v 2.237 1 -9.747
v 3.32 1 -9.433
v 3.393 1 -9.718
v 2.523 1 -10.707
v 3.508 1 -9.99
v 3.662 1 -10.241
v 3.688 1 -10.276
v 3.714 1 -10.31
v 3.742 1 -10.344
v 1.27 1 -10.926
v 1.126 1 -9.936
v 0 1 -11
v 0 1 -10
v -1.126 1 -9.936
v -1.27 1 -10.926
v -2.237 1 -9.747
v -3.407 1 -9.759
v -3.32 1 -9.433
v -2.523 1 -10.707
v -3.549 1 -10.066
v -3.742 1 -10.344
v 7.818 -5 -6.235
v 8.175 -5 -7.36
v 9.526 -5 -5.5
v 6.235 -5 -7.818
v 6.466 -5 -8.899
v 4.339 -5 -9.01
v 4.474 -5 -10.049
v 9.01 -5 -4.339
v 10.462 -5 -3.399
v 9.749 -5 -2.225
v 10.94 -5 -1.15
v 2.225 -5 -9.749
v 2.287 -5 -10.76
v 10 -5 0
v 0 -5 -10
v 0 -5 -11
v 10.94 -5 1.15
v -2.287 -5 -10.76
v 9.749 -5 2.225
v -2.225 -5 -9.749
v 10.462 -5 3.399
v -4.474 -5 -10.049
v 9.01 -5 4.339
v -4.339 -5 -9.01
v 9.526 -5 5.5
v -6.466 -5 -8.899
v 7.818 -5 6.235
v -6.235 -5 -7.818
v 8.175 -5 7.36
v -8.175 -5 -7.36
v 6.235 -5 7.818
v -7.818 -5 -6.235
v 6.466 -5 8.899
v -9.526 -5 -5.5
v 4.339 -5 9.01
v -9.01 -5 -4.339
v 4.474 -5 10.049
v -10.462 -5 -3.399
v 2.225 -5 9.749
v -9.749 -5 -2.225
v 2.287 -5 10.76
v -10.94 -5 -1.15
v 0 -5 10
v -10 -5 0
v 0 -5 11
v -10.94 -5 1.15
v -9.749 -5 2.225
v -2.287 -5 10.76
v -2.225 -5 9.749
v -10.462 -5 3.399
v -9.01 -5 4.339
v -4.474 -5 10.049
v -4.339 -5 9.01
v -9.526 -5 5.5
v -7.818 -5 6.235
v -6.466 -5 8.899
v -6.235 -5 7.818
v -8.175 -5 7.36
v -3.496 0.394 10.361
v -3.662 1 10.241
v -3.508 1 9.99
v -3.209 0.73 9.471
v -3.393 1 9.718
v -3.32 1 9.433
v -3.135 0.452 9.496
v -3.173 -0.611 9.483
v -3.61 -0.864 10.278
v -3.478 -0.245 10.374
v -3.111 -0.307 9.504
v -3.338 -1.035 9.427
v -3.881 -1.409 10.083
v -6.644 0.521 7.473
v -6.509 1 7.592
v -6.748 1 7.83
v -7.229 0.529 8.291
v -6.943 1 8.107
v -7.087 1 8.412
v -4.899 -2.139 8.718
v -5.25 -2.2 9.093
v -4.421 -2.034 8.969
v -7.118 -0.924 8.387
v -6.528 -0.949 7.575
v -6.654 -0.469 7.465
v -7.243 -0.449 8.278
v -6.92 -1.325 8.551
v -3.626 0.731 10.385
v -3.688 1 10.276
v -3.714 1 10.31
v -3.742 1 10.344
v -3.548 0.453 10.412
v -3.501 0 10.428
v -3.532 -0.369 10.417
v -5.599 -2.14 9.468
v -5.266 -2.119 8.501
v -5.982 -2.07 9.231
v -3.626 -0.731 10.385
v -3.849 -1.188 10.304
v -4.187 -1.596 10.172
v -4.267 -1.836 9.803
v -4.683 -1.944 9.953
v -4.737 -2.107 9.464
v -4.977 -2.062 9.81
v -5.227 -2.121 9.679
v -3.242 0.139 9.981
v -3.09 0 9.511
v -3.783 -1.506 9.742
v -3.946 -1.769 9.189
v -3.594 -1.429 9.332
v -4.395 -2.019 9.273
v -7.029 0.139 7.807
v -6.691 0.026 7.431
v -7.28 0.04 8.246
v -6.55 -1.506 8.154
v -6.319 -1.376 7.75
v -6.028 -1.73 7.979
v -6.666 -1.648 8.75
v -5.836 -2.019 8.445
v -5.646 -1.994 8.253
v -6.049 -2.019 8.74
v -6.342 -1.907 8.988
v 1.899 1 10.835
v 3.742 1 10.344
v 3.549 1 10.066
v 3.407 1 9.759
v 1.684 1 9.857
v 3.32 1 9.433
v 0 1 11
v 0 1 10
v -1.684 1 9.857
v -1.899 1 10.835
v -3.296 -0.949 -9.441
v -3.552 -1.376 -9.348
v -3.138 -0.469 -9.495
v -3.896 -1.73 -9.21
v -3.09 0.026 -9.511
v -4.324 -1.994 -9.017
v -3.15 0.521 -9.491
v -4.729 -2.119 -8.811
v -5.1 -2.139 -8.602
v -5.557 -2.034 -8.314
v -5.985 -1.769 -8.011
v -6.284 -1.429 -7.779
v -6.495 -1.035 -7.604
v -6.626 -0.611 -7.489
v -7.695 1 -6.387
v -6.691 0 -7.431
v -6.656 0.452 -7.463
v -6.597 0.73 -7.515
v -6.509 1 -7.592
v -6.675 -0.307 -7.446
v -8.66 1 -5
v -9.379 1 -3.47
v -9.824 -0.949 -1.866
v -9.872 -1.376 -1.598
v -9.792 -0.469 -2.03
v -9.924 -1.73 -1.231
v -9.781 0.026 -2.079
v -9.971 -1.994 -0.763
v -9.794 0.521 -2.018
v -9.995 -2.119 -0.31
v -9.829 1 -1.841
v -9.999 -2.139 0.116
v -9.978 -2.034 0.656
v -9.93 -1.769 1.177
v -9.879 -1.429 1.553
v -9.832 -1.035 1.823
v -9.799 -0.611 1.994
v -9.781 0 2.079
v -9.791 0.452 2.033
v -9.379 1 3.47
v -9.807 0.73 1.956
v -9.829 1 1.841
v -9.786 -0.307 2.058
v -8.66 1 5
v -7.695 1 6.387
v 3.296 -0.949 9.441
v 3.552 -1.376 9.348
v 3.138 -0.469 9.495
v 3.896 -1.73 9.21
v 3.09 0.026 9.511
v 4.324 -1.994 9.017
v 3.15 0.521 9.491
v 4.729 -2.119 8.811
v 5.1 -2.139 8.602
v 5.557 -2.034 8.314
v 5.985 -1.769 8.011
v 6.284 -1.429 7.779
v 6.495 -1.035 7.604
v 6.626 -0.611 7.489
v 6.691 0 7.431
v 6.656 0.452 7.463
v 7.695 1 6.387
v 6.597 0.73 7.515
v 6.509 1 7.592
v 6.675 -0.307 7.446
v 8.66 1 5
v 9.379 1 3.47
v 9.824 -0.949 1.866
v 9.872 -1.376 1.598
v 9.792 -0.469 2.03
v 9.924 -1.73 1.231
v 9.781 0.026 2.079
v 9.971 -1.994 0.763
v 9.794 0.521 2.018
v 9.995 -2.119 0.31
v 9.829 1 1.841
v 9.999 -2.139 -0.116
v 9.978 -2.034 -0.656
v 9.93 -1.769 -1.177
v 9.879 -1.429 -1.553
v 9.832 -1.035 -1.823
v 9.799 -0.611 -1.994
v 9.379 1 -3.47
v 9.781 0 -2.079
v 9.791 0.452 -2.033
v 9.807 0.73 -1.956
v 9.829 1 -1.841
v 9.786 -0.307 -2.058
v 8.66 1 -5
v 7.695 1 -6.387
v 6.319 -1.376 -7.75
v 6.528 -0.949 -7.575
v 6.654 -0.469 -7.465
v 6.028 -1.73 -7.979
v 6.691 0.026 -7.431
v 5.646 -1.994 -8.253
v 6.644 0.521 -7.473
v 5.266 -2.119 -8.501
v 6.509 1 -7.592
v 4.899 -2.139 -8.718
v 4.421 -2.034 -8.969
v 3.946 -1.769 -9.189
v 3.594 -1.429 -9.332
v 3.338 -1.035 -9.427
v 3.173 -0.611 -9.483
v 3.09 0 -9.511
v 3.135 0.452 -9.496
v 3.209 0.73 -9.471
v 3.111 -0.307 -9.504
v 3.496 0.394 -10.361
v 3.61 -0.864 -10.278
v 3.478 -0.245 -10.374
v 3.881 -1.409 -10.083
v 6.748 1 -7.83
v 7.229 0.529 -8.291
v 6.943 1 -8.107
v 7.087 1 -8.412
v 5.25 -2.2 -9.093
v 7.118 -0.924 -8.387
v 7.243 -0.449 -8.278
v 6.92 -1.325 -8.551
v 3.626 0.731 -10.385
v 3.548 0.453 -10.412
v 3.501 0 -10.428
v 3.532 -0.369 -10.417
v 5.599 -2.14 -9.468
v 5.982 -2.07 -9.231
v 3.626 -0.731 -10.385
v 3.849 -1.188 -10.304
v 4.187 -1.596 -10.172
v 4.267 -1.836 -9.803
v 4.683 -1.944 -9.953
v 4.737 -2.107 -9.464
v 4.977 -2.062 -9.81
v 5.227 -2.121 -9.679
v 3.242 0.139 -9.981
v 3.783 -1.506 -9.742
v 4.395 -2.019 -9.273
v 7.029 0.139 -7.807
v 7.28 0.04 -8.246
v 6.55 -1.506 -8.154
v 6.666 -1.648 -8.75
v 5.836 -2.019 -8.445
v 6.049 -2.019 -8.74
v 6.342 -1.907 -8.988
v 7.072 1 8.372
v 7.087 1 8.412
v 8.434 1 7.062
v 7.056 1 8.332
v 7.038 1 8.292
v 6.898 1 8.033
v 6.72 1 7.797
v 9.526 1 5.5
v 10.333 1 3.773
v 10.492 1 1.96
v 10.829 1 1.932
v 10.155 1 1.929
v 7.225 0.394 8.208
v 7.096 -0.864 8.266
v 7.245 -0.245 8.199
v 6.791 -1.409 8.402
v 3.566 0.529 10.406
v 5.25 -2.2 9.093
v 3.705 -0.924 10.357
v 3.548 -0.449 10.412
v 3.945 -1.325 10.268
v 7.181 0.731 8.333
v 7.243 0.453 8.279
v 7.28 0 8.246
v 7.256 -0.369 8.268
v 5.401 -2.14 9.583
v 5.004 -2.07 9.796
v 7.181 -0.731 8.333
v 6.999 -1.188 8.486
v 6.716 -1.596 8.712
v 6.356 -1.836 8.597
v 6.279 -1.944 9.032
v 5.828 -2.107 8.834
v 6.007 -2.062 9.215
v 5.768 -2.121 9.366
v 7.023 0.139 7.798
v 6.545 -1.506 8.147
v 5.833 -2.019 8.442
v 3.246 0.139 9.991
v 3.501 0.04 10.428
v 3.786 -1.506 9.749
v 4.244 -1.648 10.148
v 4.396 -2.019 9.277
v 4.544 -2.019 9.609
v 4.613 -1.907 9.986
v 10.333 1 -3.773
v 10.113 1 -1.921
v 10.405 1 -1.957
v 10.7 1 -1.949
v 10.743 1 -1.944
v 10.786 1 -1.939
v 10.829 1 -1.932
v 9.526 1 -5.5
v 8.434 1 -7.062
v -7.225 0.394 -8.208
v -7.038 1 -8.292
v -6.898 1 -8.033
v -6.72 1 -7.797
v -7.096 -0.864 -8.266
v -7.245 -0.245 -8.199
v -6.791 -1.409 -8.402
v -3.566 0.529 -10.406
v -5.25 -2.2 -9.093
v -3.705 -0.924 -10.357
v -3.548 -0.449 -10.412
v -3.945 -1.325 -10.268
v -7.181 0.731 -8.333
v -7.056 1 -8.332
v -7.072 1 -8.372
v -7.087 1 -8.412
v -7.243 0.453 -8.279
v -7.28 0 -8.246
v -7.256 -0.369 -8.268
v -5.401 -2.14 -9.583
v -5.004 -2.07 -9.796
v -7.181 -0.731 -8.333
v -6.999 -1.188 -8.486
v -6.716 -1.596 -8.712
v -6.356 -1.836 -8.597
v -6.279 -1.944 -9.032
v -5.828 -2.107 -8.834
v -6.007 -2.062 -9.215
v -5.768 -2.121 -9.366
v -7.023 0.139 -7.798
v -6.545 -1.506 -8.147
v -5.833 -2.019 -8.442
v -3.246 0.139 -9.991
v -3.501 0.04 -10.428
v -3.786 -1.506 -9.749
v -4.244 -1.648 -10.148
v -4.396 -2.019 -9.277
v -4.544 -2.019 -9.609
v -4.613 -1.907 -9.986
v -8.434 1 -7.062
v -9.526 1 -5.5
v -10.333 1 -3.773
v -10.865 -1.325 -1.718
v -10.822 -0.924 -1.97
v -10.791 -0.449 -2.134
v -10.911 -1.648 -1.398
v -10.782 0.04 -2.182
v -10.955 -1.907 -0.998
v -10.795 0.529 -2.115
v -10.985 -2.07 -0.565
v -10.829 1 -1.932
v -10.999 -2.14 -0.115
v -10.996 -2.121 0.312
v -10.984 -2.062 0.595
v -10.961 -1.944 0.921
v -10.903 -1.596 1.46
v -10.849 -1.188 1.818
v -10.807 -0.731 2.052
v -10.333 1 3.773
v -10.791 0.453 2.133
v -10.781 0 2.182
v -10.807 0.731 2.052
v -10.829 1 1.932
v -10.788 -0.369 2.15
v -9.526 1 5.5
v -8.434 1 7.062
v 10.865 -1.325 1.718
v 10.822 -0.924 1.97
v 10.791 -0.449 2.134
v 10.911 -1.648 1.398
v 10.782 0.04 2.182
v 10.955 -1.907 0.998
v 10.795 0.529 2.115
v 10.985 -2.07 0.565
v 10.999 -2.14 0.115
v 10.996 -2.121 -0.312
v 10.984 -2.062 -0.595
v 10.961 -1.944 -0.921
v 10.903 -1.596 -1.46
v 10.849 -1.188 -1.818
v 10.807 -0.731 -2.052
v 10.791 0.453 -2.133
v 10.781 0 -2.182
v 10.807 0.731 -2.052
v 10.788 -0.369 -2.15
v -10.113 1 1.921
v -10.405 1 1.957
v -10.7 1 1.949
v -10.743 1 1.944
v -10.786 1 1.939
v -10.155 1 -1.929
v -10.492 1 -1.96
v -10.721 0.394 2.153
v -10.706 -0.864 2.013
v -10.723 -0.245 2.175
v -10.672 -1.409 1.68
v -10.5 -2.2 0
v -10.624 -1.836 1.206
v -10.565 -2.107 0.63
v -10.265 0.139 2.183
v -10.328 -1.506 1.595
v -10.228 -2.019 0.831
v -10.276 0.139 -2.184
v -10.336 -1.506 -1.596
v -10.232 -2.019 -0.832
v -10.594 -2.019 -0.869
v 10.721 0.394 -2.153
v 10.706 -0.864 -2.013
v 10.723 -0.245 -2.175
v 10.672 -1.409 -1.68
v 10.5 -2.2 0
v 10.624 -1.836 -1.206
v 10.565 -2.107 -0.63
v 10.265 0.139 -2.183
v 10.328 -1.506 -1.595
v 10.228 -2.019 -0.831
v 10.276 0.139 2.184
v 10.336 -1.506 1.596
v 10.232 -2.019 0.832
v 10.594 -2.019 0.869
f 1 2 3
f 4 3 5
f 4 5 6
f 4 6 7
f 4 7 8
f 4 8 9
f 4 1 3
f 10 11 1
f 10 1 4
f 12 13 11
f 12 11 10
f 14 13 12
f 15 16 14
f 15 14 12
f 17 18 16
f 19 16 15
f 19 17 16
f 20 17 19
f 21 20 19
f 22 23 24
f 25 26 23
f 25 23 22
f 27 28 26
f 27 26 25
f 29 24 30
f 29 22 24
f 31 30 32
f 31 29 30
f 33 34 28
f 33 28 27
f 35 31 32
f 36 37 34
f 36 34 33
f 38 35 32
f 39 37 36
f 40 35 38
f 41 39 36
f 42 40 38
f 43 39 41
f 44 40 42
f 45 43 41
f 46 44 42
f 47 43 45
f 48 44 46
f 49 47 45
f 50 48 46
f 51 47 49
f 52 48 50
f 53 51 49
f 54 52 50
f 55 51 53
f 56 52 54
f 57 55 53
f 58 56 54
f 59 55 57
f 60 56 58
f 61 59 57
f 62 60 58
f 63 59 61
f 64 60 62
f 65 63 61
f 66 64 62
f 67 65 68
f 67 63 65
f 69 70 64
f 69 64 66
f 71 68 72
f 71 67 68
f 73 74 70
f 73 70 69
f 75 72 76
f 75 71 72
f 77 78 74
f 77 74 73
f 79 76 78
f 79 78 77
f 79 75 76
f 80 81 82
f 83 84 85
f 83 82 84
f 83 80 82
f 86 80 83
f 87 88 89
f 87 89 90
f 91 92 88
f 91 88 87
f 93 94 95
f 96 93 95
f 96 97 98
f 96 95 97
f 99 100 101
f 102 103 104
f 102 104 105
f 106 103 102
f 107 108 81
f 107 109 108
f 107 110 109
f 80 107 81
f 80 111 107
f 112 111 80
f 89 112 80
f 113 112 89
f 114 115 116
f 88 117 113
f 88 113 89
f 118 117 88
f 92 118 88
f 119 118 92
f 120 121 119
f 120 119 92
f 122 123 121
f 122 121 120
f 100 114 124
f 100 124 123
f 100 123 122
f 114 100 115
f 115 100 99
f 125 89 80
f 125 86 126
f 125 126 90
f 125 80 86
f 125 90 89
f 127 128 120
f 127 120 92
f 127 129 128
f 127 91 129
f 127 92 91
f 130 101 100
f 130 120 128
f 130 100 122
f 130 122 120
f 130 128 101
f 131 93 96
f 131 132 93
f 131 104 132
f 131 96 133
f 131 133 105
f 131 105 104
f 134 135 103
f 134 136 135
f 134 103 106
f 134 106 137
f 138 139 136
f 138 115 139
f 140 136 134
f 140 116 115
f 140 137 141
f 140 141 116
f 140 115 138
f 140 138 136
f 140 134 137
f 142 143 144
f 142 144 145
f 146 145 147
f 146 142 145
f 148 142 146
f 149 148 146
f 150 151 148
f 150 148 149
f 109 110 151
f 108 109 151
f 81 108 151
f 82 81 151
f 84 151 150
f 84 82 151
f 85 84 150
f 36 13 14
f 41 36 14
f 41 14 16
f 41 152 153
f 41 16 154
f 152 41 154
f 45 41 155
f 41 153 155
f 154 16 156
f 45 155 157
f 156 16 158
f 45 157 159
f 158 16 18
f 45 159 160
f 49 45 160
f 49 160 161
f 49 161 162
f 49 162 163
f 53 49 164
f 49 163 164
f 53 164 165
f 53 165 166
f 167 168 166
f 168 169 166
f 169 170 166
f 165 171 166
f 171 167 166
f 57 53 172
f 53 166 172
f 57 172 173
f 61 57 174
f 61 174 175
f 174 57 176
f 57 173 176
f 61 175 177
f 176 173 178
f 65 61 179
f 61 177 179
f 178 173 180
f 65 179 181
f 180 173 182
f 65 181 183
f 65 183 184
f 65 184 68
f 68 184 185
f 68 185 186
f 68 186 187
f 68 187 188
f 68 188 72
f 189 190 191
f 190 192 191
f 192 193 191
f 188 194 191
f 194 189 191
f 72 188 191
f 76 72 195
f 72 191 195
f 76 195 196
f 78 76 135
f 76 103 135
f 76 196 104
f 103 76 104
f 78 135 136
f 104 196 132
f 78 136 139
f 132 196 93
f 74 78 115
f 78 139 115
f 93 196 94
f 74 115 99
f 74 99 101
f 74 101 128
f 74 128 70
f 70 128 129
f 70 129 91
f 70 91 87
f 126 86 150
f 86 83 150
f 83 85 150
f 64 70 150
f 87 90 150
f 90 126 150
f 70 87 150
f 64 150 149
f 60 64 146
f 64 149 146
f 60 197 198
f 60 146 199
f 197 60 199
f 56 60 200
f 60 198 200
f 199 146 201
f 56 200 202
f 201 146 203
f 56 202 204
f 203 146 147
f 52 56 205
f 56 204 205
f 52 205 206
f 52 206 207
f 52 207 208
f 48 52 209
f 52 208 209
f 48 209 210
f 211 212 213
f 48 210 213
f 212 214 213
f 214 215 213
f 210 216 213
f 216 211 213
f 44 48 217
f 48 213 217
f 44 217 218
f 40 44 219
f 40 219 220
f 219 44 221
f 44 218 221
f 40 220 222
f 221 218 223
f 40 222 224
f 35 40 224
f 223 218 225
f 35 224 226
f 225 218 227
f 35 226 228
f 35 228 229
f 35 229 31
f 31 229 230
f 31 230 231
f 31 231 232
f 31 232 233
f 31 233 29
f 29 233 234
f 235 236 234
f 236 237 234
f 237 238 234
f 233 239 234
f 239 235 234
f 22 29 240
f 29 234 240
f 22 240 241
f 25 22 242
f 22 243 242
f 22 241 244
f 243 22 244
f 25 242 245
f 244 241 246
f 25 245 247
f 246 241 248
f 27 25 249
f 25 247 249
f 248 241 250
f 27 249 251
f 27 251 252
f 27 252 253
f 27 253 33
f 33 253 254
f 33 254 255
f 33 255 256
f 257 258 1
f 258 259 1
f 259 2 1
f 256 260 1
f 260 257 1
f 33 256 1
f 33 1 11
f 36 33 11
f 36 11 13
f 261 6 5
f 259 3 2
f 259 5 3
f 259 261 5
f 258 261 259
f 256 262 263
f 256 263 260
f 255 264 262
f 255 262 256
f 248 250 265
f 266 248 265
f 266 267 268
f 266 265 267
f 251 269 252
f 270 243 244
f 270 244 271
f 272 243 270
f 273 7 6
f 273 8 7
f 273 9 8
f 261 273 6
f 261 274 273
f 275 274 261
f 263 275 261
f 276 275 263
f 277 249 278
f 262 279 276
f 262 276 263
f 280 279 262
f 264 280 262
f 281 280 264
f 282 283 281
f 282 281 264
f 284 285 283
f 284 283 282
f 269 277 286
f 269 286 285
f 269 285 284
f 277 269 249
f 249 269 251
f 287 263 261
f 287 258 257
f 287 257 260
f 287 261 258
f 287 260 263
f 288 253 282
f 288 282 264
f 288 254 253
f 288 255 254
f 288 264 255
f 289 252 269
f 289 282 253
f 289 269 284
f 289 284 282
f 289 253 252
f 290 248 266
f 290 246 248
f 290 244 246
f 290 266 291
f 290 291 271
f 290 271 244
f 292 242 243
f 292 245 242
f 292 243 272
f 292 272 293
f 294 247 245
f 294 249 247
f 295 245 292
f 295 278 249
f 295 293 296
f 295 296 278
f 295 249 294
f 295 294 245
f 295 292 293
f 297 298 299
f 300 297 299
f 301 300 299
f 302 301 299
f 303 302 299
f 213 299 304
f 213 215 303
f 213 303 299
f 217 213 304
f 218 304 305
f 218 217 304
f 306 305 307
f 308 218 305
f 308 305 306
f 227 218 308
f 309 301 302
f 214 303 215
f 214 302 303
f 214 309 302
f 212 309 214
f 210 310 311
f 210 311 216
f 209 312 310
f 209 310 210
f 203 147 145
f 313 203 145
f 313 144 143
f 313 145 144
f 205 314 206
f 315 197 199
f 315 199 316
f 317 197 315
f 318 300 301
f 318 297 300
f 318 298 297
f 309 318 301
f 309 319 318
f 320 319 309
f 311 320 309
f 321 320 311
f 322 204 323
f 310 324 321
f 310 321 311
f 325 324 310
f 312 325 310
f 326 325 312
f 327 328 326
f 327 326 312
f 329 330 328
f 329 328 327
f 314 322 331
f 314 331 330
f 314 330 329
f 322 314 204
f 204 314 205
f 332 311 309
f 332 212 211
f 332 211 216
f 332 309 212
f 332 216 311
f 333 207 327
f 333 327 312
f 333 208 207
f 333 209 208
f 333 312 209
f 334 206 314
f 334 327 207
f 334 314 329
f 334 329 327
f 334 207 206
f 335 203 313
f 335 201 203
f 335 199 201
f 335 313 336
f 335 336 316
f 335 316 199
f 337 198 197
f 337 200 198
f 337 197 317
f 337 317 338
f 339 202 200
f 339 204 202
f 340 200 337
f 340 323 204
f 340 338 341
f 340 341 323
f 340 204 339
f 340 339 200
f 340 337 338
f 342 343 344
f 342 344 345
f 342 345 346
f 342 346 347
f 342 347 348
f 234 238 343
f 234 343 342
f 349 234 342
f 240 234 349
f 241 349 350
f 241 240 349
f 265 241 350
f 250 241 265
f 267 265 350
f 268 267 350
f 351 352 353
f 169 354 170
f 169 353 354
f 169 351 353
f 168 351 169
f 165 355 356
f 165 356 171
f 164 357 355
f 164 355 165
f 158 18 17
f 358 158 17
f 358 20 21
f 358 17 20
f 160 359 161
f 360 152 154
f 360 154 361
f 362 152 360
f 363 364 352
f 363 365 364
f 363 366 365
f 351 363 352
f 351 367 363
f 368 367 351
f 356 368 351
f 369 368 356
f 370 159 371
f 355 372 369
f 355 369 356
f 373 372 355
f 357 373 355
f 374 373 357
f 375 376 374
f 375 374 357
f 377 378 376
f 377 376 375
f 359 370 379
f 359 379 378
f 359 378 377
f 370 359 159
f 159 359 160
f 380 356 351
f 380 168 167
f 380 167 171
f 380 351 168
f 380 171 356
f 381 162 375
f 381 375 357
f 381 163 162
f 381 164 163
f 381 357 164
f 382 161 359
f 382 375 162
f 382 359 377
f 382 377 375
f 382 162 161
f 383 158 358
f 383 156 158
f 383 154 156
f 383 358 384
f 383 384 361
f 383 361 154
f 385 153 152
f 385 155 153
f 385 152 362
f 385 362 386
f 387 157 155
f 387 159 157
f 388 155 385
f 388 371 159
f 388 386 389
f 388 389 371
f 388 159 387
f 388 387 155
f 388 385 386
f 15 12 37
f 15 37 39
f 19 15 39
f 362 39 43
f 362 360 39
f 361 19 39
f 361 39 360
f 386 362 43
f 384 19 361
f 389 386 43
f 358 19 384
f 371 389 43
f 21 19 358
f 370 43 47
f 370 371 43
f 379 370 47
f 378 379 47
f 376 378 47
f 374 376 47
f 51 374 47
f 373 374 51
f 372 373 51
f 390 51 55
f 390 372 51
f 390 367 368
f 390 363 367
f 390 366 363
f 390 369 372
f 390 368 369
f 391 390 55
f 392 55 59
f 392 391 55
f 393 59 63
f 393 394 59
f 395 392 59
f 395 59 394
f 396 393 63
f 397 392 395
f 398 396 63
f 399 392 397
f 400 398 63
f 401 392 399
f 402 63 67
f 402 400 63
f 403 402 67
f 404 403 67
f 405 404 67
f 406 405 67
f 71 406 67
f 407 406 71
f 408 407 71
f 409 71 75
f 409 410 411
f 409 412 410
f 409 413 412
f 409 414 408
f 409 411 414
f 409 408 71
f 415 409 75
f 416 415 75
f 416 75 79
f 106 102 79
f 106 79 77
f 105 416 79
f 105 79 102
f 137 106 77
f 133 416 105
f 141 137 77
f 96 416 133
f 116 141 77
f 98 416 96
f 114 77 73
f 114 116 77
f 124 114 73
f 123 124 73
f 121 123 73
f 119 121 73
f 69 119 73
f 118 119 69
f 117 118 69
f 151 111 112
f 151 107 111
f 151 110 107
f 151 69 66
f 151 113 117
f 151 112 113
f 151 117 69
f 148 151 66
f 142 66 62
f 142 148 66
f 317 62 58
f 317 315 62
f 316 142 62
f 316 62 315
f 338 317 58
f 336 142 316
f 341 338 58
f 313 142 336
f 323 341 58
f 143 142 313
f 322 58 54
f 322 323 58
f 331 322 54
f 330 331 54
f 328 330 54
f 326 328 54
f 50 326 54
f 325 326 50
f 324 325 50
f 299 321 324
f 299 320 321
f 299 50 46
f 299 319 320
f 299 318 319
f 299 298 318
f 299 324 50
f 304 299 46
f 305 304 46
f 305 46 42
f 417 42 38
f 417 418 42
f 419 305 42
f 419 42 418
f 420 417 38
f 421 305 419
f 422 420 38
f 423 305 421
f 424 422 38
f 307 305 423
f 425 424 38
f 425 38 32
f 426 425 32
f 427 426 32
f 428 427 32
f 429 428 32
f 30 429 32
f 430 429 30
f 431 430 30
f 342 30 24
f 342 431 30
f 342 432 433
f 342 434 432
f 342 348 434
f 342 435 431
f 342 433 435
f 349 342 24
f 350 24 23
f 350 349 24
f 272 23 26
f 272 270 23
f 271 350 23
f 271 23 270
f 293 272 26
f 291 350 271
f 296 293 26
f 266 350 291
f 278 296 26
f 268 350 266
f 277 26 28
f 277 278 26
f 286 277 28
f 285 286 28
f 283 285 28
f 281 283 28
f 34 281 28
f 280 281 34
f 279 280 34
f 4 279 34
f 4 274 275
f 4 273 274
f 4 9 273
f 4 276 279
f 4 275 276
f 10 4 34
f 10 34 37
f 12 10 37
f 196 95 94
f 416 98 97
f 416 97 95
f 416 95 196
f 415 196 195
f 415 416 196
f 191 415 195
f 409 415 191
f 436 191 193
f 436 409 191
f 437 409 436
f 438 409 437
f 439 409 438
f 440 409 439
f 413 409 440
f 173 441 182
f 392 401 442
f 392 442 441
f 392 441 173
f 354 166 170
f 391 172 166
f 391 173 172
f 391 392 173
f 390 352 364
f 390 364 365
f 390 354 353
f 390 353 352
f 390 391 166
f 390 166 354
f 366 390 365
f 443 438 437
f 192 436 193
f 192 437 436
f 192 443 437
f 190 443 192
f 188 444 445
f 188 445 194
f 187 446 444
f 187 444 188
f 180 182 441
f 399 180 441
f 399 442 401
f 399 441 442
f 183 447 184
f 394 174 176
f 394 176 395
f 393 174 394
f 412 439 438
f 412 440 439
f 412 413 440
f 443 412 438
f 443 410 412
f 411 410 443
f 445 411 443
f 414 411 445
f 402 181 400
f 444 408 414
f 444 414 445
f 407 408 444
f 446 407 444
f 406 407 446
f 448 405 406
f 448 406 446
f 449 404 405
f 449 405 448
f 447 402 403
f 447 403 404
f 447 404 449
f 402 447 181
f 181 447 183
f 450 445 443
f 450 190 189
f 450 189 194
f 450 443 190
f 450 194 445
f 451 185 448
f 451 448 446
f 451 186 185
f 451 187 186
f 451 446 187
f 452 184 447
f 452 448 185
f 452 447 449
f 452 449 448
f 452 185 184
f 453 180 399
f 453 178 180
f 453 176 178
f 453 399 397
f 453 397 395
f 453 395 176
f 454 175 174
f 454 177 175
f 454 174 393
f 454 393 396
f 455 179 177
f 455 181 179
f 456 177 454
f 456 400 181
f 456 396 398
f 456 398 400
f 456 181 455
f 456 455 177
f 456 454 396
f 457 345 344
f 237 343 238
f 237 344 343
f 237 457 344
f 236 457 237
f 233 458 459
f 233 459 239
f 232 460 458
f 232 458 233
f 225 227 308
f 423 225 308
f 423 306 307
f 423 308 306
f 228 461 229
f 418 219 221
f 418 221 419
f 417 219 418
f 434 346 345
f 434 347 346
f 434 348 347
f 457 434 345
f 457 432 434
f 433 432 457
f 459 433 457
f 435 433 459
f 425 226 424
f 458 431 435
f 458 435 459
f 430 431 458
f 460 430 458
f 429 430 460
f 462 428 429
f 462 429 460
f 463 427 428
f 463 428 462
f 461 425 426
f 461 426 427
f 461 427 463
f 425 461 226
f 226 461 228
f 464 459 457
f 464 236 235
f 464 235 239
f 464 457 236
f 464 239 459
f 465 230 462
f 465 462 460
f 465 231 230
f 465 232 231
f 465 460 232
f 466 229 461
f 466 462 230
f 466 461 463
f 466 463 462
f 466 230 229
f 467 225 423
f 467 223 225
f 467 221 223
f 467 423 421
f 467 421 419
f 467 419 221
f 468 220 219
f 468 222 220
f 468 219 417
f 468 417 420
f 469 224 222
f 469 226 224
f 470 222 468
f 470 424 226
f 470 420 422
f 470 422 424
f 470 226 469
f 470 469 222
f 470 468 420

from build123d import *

# Parameters (mm, degrees)
SKETCH3_W          = 1
SKETCH3_H          = 10
CIRPATTERN1_COUNT  = 6
SKETCH5_R          = 11
SKETCH5_R_2        = 10
CUT_EXTRUDE1_DEPTH = 4


with BuildPart() as part:
    # Sketch3 → Revolve3 (revolve)
    with BuildSketch(Plane.XY):
        with Locations((10.5, 0)):
            Rectangle(SKETCH3_W, SKETCH3_H)
    revolve(axis=Axis((0, 0, 0), (0, 1, 0)))

    # Sketch4 → Cut-Revolve1 (revolve, cut)
    with BuildSketch(Plane.XY):
        with BuildLine():
            Line((10.5, 2.2), (10.5, -2.2))
            ThreePointArc((10.5, -2.2), (12.055634919, -1.555634919), (12.7, 0))
            ThreePointArc((12.7, 0), (12.055634919, 1.555634919), (10.5, 2.2))
        make_face()
    cut_revolve1 = revolve(axis=Axis((10.5, -2.2, 0), (0, 1, 0)), mode=Mode.SUBTRACT)

    # CirPattern1: Cut-Revolve1 ×6 about axis
    cirpattern1_axis = Axis((0, 5, 0), (0, -1, 0))
    for i in range(1, CIRPATTERN1_COUNT):
        add(cut_revolve1.rotate(cirpattern1_axis, i * 360 / CIRPATTERN1_COUNT), mode=Mode.SUBTRACT)

    # Sketch5 → Cut-Extrude1 (cut)
    with BuildSketch(Plane(origin=(0, 5, 0), x_dir=(1, 0, 0), z_dir=(0, 1, 0))):
        Circle(SKETCH5_R)
        Circle(SKETCH5_R_2, mode=Mode.SUBTRACT)
    extrude(amount=-CUT_EXTRUDE1_DEPTH, mode=Mode.SUBTRACT)


solid = part.part
